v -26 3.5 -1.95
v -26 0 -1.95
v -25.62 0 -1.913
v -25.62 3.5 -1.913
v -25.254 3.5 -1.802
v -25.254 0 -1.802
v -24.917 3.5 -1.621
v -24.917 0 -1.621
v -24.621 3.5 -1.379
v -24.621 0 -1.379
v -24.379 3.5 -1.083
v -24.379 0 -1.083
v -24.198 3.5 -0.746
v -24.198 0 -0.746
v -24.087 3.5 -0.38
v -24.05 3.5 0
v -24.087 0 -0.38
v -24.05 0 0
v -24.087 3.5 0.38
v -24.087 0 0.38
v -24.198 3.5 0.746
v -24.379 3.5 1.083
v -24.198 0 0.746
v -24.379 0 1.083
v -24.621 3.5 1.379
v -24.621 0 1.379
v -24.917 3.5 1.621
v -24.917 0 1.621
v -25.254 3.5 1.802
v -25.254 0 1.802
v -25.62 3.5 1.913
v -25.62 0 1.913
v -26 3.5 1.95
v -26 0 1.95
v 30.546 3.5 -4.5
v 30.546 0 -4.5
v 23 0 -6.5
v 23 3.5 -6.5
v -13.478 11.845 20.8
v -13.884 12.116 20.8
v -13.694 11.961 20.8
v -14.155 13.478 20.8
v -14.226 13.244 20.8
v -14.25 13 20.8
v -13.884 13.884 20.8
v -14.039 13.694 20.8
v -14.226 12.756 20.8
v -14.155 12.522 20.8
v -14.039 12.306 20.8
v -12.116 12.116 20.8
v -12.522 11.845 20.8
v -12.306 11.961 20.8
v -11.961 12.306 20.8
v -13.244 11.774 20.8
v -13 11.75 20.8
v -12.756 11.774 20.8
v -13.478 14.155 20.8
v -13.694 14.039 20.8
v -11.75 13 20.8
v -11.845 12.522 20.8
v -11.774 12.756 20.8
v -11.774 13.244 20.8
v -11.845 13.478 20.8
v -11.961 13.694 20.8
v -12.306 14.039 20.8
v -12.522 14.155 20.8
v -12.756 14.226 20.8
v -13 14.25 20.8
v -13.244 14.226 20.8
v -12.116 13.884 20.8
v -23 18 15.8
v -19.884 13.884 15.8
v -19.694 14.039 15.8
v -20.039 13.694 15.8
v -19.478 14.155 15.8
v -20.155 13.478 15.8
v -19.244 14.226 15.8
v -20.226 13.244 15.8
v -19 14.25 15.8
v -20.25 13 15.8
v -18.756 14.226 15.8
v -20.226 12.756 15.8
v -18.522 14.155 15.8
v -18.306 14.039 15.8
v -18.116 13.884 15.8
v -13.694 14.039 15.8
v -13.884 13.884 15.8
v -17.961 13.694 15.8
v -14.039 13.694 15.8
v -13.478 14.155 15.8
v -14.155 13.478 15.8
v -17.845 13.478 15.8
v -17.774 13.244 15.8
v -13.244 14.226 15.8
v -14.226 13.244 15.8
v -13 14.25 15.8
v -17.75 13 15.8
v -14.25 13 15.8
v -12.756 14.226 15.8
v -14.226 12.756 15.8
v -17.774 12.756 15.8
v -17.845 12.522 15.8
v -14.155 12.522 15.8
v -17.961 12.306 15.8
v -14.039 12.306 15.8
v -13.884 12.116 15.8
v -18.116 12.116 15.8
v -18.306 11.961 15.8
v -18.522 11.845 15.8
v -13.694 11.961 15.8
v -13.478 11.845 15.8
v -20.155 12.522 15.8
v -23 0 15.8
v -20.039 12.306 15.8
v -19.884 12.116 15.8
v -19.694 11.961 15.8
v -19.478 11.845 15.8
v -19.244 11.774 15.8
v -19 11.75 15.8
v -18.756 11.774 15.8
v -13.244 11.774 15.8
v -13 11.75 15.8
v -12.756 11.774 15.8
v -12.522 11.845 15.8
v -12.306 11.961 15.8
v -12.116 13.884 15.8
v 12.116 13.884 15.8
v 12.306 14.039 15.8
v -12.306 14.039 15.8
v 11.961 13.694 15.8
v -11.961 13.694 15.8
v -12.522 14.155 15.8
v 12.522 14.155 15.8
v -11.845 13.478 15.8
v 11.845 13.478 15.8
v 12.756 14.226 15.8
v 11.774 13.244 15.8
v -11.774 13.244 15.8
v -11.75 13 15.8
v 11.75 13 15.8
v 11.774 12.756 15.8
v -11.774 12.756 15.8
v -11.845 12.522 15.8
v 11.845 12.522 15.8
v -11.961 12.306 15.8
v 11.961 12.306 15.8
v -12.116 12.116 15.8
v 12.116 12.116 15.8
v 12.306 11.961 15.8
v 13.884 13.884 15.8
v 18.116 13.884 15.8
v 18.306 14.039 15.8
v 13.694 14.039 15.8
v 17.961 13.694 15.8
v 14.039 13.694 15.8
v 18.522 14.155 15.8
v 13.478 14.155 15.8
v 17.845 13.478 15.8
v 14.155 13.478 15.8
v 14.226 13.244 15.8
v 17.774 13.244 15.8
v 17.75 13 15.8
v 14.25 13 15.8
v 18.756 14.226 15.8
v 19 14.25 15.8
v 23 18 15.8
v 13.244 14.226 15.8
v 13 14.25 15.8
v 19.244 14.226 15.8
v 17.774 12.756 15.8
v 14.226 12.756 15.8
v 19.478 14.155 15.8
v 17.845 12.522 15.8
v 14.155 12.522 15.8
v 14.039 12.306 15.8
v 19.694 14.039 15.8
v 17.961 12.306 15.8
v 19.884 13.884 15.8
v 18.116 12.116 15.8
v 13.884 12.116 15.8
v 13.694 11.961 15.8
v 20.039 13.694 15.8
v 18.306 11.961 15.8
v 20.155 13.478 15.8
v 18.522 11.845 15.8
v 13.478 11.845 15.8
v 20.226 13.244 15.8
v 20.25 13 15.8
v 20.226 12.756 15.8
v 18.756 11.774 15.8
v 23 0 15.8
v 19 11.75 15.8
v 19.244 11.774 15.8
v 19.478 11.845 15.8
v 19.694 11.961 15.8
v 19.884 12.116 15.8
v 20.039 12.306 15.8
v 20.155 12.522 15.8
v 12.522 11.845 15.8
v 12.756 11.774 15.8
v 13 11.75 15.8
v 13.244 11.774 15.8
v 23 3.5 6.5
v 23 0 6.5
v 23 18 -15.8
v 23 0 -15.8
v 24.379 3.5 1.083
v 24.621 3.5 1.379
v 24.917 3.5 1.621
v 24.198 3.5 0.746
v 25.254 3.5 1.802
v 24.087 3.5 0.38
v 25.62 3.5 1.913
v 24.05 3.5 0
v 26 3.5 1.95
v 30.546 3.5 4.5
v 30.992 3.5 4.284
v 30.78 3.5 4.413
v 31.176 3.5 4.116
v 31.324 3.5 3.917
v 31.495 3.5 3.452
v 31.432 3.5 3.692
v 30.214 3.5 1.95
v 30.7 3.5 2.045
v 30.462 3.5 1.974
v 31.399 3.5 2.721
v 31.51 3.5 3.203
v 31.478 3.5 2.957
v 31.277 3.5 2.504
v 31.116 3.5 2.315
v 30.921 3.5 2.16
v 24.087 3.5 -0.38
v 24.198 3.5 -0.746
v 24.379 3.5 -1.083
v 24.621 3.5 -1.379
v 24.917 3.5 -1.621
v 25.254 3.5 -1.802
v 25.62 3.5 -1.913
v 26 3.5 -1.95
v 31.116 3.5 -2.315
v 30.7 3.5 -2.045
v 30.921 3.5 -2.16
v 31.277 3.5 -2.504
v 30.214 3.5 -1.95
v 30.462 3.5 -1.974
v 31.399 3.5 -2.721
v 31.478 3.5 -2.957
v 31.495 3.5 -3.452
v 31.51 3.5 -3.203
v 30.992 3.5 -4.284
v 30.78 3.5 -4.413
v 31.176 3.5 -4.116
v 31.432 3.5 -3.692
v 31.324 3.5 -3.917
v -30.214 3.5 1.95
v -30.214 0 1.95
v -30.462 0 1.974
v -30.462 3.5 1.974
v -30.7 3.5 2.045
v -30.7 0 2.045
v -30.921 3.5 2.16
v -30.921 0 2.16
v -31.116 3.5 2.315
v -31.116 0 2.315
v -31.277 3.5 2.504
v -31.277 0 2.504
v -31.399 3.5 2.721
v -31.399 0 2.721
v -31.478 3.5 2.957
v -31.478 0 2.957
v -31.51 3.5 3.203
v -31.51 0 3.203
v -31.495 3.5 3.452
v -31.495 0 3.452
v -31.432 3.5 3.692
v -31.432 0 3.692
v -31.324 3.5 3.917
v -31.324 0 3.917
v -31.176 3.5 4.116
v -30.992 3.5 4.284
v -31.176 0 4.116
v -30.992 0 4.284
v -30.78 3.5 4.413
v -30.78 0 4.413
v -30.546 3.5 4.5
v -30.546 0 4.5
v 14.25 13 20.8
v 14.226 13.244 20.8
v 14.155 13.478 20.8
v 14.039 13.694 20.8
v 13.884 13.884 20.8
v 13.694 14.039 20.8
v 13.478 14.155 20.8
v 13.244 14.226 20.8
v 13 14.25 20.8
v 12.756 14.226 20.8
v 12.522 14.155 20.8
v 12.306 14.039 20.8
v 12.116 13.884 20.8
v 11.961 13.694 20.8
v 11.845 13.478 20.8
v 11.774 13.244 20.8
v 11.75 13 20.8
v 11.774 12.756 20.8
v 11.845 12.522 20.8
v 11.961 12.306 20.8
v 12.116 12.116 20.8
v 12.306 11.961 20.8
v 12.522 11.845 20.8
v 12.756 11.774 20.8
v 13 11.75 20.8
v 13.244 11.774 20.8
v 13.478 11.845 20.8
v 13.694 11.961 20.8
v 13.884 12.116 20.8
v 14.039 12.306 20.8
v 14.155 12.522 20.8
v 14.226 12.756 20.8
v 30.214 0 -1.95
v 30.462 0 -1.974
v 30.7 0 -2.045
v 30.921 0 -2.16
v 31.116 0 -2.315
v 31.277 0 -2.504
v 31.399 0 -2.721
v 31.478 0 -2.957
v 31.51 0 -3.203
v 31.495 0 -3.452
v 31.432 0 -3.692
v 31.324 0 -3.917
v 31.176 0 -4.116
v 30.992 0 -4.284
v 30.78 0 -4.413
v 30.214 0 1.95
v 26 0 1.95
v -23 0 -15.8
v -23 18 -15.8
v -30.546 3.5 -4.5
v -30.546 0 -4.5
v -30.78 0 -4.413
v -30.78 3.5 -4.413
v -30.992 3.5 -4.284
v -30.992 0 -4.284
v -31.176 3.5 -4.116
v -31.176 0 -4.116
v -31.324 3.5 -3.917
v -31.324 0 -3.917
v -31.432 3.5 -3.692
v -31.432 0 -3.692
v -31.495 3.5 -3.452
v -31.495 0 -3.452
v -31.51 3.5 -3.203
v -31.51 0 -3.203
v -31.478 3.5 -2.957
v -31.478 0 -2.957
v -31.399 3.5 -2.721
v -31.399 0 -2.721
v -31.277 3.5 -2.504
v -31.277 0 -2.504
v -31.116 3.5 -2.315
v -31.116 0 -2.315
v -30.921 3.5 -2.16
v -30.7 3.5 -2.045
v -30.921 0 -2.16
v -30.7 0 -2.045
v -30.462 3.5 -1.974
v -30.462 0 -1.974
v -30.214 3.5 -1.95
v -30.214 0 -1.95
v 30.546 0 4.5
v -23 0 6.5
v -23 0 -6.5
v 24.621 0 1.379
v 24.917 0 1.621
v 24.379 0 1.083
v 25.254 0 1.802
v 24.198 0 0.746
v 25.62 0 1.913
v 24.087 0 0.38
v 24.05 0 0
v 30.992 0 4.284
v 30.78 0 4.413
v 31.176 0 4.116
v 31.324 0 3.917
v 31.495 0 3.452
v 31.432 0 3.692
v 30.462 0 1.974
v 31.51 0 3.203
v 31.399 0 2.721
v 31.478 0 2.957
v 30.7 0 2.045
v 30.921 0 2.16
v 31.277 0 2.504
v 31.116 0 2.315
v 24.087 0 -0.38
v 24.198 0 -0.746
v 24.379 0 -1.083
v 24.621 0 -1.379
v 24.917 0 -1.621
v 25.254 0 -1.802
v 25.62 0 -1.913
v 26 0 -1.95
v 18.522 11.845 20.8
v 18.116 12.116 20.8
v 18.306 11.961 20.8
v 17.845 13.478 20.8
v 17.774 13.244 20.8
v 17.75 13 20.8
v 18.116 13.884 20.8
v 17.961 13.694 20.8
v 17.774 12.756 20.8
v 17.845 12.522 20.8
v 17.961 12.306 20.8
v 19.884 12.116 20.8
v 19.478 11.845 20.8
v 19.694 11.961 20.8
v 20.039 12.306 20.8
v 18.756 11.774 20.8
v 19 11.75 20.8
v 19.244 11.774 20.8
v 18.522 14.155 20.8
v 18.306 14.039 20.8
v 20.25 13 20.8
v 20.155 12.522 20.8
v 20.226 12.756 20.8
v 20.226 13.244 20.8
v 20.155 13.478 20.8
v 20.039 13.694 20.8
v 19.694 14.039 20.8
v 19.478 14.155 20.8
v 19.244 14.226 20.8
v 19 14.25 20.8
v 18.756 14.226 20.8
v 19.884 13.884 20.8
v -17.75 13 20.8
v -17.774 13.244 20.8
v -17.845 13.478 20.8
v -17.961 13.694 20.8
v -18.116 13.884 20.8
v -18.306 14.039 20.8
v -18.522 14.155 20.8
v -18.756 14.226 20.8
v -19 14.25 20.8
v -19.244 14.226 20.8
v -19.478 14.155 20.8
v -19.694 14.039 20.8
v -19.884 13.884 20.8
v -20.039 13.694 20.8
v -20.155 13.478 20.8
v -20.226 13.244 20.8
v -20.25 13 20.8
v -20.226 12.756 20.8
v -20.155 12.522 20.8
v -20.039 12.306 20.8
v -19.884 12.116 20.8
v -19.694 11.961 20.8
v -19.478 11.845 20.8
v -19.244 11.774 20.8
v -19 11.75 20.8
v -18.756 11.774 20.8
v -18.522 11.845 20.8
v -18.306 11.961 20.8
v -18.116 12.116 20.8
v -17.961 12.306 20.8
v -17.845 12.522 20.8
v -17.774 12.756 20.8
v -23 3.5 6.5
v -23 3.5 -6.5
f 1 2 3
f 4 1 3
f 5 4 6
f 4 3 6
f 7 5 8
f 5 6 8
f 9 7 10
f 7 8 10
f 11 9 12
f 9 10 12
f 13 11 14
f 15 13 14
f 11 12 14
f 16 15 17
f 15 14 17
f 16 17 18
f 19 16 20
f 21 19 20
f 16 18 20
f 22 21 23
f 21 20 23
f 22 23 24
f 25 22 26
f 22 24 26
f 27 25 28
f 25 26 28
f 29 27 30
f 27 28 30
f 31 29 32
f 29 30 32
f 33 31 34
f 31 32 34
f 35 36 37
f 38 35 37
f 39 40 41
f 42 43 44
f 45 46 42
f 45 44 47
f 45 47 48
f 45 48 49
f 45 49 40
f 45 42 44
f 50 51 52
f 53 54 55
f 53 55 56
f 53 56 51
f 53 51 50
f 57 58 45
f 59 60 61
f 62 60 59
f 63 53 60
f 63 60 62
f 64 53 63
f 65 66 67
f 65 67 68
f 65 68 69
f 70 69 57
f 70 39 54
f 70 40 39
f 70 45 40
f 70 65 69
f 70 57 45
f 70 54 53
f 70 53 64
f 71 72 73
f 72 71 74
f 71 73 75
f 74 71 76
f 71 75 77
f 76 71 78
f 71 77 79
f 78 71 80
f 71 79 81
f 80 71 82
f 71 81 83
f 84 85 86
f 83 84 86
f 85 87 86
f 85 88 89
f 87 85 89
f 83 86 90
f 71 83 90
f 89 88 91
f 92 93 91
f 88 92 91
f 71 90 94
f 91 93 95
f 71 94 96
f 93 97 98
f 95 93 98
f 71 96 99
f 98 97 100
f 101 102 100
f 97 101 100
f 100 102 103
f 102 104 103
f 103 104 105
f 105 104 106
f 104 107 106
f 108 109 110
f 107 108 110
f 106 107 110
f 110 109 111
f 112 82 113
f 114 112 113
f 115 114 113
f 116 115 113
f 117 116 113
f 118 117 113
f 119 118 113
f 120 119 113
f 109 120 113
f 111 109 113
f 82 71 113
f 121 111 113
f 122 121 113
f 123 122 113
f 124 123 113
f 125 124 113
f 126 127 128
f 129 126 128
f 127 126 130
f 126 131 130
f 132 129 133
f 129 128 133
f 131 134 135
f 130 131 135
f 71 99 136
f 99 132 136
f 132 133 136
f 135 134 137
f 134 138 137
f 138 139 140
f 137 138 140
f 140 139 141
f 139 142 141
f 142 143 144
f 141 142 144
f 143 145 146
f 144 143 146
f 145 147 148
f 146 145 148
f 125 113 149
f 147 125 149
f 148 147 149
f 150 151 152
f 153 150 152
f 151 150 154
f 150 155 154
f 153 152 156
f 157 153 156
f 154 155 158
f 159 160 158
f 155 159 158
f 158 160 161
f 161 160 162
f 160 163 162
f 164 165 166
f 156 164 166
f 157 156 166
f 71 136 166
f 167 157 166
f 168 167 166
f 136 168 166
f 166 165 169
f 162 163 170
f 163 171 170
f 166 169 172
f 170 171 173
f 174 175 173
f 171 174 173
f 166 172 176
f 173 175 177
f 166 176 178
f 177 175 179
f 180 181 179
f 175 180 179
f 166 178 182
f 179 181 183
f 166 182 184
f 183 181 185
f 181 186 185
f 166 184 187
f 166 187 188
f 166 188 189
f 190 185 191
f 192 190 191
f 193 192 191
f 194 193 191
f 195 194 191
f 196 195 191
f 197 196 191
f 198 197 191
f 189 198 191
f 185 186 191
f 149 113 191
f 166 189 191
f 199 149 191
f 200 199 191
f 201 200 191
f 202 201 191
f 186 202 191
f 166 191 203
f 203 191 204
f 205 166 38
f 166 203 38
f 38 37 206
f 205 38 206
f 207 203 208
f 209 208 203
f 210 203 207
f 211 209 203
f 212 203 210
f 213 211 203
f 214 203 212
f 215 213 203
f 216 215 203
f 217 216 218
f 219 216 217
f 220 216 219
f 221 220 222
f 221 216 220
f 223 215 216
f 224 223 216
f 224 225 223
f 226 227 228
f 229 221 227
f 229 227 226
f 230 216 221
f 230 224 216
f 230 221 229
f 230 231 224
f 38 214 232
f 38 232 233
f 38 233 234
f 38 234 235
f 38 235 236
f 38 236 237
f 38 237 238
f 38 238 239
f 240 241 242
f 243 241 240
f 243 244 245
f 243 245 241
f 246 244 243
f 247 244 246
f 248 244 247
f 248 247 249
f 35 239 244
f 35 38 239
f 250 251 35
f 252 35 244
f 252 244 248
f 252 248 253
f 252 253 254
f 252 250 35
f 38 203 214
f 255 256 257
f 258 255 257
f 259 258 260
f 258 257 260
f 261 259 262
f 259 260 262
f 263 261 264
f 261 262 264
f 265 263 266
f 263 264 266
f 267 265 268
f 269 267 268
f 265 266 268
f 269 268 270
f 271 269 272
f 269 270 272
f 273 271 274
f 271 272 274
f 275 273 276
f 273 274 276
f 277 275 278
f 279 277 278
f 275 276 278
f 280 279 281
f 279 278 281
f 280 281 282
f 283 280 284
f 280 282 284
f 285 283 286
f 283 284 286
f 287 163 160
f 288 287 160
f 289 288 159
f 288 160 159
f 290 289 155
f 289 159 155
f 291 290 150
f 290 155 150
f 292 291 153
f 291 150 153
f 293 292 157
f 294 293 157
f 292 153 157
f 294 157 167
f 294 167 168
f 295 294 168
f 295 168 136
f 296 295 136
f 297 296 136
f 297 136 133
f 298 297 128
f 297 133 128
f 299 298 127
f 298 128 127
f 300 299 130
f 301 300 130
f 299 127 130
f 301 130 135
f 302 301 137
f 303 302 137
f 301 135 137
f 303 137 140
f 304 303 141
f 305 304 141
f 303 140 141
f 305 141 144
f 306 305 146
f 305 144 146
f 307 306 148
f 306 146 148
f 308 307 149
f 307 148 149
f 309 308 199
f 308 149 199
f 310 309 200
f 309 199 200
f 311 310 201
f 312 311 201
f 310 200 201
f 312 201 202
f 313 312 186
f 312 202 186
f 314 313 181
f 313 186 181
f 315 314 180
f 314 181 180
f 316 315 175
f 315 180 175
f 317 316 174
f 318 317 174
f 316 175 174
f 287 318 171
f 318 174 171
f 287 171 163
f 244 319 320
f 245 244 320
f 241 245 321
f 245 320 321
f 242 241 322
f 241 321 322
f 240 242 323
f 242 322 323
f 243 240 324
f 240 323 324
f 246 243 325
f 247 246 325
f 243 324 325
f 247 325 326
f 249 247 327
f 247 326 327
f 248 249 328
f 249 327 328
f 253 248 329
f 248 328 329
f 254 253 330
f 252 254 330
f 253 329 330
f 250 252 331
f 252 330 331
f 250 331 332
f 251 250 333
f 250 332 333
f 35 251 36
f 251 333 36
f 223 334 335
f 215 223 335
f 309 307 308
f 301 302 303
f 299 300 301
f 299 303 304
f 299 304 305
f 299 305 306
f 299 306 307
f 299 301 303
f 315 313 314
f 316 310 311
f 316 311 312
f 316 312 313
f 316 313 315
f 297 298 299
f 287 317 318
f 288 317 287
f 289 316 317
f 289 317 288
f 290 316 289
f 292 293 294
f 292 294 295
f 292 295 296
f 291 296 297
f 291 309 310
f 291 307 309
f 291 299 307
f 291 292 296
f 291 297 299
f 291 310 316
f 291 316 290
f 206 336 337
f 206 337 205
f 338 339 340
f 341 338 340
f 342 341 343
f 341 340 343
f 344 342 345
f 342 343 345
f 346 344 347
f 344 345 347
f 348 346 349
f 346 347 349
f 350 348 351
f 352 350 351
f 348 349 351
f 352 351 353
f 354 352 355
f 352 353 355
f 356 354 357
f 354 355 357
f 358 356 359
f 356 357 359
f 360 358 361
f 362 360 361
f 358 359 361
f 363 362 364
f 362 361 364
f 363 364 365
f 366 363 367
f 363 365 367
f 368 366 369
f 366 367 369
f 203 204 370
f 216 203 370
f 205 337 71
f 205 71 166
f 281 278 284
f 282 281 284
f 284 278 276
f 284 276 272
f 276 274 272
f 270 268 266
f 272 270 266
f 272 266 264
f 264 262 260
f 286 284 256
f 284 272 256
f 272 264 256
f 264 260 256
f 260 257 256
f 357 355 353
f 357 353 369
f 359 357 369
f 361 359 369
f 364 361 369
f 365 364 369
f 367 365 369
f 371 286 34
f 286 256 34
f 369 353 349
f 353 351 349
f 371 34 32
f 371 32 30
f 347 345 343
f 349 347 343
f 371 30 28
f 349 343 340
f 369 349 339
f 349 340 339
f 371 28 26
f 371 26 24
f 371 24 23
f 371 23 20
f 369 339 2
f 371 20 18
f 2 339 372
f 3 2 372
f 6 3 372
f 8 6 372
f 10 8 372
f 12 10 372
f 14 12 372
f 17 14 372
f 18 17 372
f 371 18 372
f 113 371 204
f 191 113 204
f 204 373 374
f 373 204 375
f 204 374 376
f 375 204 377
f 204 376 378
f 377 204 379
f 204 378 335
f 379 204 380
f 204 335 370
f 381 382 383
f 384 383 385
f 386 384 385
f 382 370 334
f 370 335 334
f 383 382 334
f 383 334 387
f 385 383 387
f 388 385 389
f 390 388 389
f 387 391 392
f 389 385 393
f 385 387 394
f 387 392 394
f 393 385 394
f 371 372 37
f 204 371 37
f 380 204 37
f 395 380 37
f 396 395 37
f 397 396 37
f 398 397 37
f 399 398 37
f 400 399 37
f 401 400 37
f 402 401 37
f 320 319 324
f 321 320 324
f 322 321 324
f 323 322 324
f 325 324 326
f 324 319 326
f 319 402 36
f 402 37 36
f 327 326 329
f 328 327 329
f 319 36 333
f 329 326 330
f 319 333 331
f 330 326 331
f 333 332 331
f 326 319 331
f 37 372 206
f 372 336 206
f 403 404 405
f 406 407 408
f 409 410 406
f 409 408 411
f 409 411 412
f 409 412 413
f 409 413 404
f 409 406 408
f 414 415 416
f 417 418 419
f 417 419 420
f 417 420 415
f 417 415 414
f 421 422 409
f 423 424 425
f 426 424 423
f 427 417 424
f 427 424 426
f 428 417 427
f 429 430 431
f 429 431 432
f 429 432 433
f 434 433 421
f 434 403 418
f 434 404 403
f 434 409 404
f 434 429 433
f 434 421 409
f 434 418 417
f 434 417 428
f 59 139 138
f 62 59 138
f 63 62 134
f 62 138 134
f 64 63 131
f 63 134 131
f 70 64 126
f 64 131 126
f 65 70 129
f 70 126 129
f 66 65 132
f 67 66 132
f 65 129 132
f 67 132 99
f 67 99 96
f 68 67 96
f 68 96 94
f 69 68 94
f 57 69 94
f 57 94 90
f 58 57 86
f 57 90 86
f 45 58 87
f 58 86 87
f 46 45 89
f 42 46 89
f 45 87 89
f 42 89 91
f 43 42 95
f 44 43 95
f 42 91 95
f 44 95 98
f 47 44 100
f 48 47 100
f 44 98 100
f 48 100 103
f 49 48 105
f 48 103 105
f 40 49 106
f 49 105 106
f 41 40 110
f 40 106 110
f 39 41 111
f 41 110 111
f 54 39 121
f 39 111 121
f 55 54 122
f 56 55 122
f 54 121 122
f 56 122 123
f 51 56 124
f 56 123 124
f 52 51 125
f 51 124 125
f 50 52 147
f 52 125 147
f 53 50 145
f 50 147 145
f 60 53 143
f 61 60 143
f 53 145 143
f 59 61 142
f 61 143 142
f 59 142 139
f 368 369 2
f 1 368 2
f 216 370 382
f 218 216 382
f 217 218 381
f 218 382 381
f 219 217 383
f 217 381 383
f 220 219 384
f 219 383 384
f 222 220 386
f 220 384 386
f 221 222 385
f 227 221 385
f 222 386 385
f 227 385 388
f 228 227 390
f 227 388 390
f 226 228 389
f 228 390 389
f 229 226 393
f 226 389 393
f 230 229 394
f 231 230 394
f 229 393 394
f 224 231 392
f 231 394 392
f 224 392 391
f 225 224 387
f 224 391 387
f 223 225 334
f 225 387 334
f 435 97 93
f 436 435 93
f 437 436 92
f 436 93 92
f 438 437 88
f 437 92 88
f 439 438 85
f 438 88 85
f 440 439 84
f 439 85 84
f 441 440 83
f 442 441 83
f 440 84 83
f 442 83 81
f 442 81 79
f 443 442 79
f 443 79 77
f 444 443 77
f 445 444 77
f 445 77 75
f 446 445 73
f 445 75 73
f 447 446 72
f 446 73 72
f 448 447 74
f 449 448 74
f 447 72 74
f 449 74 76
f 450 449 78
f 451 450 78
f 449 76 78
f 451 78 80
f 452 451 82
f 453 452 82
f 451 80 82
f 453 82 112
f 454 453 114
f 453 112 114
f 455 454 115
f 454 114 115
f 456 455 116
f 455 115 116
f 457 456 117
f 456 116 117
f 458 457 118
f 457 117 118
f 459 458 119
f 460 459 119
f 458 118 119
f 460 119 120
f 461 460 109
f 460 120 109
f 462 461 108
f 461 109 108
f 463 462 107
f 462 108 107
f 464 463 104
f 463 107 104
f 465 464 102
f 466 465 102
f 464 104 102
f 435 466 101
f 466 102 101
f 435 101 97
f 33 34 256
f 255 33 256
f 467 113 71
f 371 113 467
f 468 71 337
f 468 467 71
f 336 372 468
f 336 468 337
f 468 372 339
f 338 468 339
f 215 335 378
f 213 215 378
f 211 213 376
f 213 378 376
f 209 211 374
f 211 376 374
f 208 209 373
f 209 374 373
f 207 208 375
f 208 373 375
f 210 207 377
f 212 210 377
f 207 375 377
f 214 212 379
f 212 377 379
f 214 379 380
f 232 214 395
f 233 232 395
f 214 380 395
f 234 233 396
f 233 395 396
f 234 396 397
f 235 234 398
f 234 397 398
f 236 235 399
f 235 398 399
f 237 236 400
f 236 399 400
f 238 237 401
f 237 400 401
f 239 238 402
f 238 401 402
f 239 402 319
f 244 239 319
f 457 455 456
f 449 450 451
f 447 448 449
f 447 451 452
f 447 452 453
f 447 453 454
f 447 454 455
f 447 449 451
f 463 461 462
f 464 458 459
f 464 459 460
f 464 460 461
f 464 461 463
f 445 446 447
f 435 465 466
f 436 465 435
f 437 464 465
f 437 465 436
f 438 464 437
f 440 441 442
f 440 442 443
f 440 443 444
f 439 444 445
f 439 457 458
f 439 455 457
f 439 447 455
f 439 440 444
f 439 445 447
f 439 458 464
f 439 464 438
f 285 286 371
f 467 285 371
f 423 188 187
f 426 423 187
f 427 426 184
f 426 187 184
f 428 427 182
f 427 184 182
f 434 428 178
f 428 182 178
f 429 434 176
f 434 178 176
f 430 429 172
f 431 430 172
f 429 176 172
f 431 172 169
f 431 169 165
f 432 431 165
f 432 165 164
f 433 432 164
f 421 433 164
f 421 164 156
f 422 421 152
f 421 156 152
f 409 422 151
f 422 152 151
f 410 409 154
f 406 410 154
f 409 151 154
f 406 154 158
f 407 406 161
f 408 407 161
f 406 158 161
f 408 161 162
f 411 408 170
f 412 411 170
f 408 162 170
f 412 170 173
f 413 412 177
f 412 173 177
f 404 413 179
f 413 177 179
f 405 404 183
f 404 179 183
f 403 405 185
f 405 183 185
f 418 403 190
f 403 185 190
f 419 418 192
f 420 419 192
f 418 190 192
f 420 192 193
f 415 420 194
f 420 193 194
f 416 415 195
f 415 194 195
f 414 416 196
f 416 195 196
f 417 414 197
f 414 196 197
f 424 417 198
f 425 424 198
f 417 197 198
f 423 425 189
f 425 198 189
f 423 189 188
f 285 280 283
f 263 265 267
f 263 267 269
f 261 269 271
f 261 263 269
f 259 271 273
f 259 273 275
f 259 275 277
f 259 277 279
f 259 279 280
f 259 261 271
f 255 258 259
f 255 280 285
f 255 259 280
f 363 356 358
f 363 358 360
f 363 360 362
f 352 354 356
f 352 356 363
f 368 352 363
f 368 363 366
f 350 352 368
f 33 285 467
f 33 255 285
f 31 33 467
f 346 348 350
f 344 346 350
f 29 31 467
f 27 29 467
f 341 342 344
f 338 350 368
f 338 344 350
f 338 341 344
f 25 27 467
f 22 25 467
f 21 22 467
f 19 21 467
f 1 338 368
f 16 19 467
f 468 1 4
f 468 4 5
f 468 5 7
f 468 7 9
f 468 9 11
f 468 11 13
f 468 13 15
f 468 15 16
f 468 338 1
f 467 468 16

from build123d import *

# Parameters (mm, degrees)
BOSS_EXTRUDE1_DEPTH = 18
BOSS_EXTRUDE2_DEPTH = 3.5
SKETCH2_R           = 1.25
BOSS_EXTRUDE3_DEPTH = 5


with BuildPart() as part:
    # Sketch1 → Boss-Extrude1 (new body)
    with BuildSketch(Plane(origin=(0, 0, 0), x_dir=(1, 0, 0), z_dir=(0, 1, 0))):
        Polygon((23, -6.5), (23, 6.5), (23, 15.8), (-23, 15.8), (-23, 6.5), (-23, -6.5), (-23, -15.8), (23, -15.8), align=None)
    extrude(amount=BOSS_EXTRUDE1_DEPTH)

    # Sketch1<3> → Boss-Extrude2 (add)
    with BuildSketch(Plane(origin=(0, 0, 0), x_dir=(1, 0, 0), z_dir=(0, 1, 0))):
        with BuildLine():
            Line((30.546403177, 4.5), (23, 6.5))
            Line((23, 6.5), (23, -6.5))
            Line((23, -6.5), (30.546403177, -4.5))
            ThreePointArc((30.546403177, -4.5), (31.5, -3.079144467), (30.214227812, -1.95))
            Line((30.214227812, -1.95), (26, -1.95))
            ThreePointArc((26, -1.95), (24.05, 0), (26, 1.95))
            Line((26, 1.95), (30.214227812, 1.95))
            ThreePointArc((30.214227812, 1.95), (31.5, 3.079144467), (30.546403177, 4.5))
        make_face()
        with BuildLine():
            Line((-23, -6.5), (-23, 6.5))
            Line((-23, 6.5), (-30.546403177, 4.5))
            ThreePointArc((-30.546403177, 4.5), (-31.5, 3.079144467), (-30.214227812, 1.95))
            Line((-30.214227812, 1.95), (-26, 1.95))
            ThreePointArc((-26, 1.95), (-24.05, 0), (-26, -1.95))
            Line((-26, -1.95), (-30.214227812, -1.95))
            ThreePointArc((-30.214227812, -1.95), (-31.5, -3.079144467), (-30.546403177, -4.5))
            Line((-30.546403177, -4.5), (-23, -6.5))
        make_face()
    extrude(amount=BOSS_EXTRUDE2_DEPTH)

    # Sketch2 → Boss-Extrude3 (add)
    with BuildSketch(Plane.XY.offset(15.8)):
        with Locations((19, 13)):
            Circle(SKETCH2_R)
        with Locations((13, 13)):
            Circle(SKETCH2_R)
        with Locations((-19, 13)):
            Circle(SKETCH2_R)
        with Locations((-13, 13)):
            Circle(SKETCH2_R)
    extrude(amount=BOSS_EXTRUDE3_DEPTH)


solid = part.part
